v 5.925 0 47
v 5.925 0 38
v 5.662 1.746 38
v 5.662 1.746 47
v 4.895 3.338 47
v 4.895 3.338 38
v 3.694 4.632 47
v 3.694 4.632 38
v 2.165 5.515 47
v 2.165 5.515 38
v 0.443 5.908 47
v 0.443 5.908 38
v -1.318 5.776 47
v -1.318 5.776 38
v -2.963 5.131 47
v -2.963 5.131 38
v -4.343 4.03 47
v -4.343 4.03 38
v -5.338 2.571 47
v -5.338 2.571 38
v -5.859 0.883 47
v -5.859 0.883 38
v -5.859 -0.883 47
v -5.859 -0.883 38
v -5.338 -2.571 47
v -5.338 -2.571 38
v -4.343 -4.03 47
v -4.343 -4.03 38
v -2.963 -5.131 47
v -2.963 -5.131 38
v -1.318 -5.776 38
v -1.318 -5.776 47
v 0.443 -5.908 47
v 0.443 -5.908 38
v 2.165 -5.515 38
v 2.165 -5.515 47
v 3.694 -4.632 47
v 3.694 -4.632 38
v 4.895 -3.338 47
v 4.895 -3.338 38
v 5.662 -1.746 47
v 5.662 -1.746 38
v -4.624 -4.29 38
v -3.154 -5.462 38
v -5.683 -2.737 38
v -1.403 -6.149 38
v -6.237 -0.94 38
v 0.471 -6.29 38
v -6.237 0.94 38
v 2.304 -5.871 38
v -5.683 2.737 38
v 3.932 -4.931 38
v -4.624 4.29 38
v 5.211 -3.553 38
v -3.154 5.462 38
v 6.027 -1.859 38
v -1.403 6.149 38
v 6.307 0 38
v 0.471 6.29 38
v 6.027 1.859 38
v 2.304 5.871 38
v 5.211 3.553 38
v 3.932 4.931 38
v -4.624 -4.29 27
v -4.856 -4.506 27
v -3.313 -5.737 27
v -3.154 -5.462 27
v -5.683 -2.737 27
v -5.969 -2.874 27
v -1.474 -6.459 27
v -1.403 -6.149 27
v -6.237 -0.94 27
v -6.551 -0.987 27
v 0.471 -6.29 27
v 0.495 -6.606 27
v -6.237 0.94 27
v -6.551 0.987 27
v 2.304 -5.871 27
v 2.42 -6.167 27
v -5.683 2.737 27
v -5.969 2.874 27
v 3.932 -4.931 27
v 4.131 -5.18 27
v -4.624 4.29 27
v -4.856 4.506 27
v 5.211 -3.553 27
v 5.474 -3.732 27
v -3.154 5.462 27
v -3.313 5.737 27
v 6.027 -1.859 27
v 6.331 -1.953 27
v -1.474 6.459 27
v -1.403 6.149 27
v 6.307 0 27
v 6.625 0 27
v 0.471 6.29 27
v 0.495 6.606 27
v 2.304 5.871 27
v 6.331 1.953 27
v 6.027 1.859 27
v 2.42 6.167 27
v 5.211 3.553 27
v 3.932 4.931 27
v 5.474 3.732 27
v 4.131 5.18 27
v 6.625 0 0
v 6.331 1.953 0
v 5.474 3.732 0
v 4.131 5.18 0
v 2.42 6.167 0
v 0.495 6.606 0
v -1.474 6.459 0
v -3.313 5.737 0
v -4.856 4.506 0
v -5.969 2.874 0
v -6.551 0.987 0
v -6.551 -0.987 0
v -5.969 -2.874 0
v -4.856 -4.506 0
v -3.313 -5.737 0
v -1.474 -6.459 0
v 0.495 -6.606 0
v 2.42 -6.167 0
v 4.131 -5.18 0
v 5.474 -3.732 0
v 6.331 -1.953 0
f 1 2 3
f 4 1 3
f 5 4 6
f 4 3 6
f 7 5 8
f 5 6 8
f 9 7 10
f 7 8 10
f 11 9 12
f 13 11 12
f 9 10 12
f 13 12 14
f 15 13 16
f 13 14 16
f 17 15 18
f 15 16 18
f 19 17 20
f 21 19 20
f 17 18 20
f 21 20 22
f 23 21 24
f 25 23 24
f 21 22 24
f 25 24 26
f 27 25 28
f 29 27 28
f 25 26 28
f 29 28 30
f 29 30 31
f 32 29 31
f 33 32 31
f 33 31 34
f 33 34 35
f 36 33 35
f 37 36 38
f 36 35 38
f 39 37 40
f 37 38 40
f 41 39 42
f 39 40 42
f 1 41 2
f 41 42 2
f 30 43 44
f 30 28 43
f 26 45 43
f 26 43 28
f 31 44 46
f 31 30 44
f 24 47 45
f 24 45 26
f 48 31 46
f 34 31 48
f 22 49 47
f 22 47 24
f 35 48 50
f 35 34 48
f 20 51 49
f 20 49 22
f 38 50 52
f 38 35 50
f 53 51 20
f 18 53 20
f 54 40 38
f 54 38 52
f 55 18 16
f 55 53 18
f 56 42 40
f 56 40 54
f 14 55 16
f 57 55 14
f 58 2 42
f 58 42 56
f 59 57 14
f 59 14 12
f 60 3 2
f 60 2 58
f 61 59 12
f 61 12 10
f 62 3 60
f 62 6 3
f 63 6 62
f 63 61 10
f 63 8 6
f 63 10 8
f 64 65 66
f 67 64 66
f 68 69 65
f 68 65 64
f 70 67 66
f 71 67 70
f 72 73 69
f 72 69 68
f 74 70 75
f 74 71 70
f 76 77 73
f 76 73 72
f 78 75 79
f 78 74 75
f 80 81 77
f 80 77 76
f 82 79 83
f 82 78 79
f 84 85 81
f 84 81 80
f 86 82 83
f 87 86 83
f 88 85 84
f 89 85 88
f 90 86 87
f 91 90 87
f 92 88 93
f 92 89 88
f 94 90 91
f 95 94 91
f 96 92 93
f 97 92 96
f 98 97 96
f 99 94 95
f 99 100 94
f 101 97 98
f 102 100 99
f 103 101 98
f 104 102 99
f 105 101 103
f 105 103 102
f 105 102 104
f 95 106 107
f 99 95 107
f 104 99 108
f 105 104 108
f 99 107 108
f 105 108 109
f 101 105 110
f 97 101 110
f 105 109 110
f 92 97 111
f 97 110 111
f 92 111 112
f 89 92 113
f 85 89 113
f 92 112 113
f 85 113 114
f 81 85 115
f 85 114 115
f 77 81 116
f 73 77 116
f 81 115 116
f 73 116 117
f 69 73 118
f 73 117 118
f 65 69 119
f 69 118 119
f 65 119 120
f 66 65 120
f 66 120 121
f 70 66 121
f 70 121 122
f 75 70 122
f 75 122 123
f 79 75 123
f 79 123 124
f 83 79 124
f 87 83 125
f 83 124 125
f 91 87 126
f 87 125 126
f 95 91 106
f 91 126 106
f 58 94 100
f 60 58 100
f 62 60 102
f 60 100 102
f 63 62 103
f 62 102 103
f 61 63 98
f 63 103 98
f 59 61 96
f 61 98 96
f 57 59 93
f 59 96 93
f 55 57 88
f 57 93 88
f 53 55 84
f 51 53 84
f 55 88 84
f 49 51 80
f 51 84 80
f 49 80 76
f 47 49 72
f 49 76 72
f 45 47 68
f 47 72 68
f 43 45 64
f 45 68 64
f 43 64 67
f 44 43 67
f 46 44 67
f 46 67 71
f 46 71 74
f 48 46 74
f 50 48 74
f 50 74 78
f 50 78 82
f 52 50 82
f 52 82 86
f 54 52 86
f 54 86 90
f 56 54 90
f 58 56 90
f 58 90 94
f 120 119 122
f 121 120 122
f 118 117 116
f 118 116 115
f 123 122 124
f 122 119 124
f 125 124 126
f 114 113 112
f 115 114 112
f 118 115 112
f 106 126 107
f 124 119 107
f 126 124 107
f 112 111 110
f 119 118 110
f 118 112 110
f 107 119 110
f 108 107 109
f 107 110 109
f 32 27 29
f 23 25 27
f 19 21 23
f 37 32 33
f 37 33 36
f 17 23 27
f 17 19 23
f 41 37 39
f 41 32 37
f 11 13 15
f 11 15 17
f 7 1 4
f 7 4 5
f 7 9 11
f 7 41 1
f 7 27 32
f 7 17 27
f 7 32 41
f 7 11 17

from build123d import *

# Parameters (mm, degrees)
SKETCH1_R           = 6.625
BOSS_EXTRUDE1_DEPTH = 27
SKETCH1_3_R         = 6.307204498
BOSS_EXTRUDE2_DEPTH = 38
SKETCH2_R           = 5.925018159
BOSS_EXTRUDE3_DEPTH = 9


with BuildPart() as part:
    # Sketch1 → Boss-Extrude1 (new body)
    with BuildSketch(Plane.XY):
        Circle(SKETCH1_R)
    extrude(amount=BOSS_EXTRUDE1_DEPTH)

    # Sketch1<3> → Boss-Extrude2 (add)
    with BuildSketch(Plane.XY):
        Circle(SKETCH1_3_R)
    extrude(amount=BOSS_EXTRUDE2_DEPTH)

    # Sketch2 → Boss-Extrude3 (add)
    with BuildSketch(Plane.XY.offset(38)):
        Circle(SKETCH2_R)
    extrude(amount=BOSS_EXTRUDE3_DEPTH)


solid = part.part
